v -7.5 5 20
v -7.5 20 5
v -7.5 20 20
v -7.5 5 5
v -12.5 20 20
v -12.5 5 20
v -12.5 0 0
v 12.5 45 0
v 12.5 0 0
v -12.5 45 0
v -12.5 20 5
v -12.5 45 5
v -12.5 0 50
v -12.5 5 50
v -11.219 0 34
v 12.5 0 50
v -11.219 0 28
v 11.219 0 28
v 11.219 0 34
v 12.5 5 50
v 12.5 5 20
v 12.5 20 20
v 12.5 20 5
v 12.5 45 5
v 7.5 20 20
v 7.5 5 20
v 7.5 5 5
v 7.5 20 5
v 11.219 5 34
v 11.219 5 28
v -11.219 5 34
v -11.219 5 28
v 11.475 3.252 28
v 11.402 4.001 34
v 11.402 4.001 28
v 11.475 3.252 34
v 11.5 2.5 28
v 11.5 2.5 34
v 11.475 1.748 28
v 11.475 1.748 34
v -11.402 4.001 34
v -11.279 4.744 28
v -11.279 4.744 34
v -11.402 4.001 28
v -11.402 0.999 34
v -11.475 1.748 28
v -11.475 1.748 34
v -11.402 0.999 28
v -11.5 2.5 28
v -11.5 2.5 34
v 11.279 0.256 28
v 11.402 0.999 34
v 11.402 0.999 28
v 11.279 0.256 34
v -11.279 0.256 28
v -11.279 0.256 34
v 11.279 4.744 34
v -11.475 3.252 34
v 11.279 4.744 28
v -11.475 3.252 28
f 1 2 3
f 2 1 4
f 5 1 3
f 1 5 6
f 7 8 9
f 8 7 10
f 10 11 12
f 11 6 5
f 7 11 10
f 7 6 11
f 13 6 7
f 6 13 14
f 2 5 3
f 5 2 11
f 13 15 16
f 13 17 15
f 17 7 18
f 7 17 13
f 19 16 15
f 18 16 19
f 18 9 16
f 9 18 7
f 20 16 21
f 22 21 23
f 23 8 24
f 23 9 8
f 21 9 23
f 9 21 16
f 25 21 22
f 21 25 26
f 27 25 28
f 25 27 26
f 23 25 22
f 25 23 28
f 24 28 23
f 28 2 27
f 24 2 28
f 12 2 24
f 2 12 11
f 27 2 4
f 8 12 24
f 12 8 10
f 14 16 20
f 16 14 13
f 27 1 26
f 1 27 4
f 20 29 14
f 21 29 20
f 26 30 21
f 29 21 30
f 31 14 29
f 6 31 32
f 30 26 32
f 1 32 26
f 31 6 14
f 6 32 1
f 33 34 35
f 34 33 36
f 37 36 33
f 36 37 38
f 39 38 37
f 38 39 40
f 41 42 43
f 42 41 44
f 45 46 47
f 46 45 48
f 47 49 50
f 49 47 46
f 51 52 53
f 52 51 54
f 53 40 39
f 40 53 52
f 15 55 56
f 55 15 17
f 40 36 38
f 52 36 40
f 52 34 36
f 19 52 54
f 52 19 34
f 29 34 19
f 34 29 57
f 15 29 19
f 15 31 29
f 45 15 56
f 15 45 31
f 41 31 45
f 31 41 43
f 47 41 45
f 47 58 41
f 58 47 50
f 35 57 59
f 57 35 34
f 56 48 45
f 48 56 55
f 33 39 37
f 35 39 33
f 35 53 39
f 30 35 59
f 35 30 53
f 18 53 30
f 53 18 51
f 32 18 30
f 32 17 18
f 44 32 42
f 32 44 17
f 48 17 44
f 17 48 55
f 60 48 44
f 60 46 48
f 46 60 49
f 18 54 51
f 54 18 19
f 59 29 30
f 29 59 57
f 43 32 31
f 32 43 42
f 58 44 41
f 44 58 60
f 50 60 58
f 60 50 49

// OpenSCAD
// NEMA 17 stepper motor L-shaped mounting bracket
// Print orientation: base plate on the bed, vertical plate builds upward (+Z)

// ---------------- Parameters ----------------
plate_x      = 25;     // base plate length along X (mm)
plate_y      = 45;     // base plate width along Y (mm)
plate_t      = 5;      // base plate thickness along Z (mm)

hole_m4_x    = 17;     // M4 through-hole offset from centre in X (mm)
hole_m4_y    = 30;     // M4 through-hole Y position (mm)

plate_z      = 50;     // vertical motor plate height (mm)
boss_d       = 23;     // motor centring boss hole diameter (mm)
boss_x       = 0;      // boss hole centre X (mm)
boss_z       = 28;     // boss hole centre Z (mm)

screw_d      = 3.4;    // M3 screw hole diameter (mm)
screw_pitch  = 31;     // M3 screw hole square pattern size (mm)

gusset_t     = 5;      // gusset thickness along X (mm)
gusset_y     = 20;     // gusset leg along +Y (mm)
gusset_z     = 20;     // gusset leg along +Z (mm)

eps          = 0.5;    // cutter overshoot past faces (mm)

$fn = 96;

// ---------------- Model ----------------
difference() {
    union() {
        // Base plate
        translate([-plate_x/2, 0, 0])
            cube([plate_x, plate_y, plate_t]);

        // Vertical motor plate
        translate([-plate_x/2, 0, 0])
            cube([plate_x, 5, plate_z]);

        // Gussets, flush with left and right edges
        for (sx = [-1, 1])
            translate([sx > 0 ? plate_x/2 - gusset_t : -plate_x/2, 0, 0])
                cube([gusset_t, gusset_y, gusset_z]);
    }

    // Through-holes
    translate([-hole_m4_x, hole_m4_y, -eps])
        cylinder(d = 4.5, h = plate_t + 2*eps);

    translate([hole_m4_x, hole_m4_y, -eps])
        cylinder(d = 4.5, h = plate_t + 2*eps);

    // Motor centring boss hole
    translate([boss_x, 2.5, boss_z])
        cylinder(d = boss_d, h = plate_t + 2*eps);

    // M3 screw holes on square pattern
    for (i = [0:3])
        translate([
            (i % 2 == 0) ? -screw_pitch/2 : screw_pitch/2,
            (i / 2) * screw_pitch,
            plate_z * 0.75
        ])
            cylinder(d = screw_d, h = plate_t + 2*eps);
}
